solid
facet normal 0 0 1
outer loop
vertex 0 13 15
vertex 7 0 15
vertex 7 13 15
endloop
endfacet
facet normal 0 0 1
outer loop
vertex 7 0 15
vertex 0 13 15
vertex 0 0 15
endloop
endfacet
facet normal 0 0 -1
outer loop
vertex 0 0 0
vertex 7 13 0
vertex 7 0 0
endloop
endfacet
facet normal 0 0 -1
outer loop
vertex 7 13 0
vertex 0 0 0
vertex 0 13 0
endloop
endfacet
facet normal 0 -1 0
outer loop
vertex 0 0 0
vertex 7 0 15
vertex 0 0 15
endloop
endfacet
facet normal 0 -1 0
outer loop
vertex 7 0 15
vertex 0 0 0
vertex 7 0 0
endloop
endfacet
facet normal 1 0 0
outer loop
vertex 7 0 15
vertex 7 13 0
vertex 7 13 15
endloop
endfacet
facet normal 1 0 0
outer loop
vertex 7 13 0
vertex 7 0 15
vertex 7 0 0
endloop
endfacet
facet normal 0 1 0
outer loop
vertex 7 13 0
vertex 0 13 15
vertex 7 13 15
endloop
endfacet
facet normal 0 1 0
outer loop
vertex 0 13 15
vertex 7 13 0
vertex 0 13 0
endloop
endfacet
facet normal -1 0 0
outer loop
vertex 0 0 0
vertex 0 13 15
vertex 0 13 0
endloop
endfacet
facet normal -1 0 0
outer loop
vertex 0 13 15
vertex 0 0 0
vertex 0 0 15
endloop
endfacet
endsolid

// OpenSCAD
// Generated by SolidPython 1.0.1 on 2020-07-29 00:46:55


cube(size = [7, 13, 15]);
/***********************************************
*********      SolidPython code:      **********
************************************************
 
# import packages: SolidPython
from solid import *
from solid.utils import *
from itertools import chain, combinations, permutations


class Resize:

    def __init__(self, scad_file):
        self.scad_file = scad_file
        #self.scad_file = import_scad(scad_file)
        # cone/cylinder param:
        self.r1 = 0
        self.r2 = 0
        self.h = 0
        # rectangular prism param:
        self.w = 0
        self.l = 0
        # ellipse param:
        self.r = 0

    # import OpenScad code (file name corresponds to shape)


    # classify shape + parameters
    def assign(self, param1, param2, param3):
        if self.scad_file == 'cone.scad':
            self.r1 = param1
            self.r2 = param2
            self.h = param3
        elif self.scad_file == 'cylinder.scad':
            self.r1 = param1
            self.r2 = param2
            self.h = param3
        elif self.scad_file == 'rectangularPrism.scad':
            self.h = param1
            self.l = param2
            self.w = param3
        else:
            self.r = param1
            self.h = param2

    # resize parameters
    def iterate(self):
        x = range(3, 20, 2)
        i = 1
        if self.scad_file == 'cone.scad':
            tempList = list(permutations(x, 2))
            for temp in tempList:
                param1 = temp[0]
                param2 = temp[1]
                filepath = 'produced_scad_files/' + 'cone' + str(param1) + '_' + str(param2) + '_' + '.scad'
                scad_render_to_file(cylinder(h=param1, r1=param2, r2=0), filepath)

        elif self.scad_file == 'cylinder.scad':
            tempList = list(permutations(x, 3))
            for temp in tempList:
                param1 = temp[0]
                param2 = temp[1]
                filepath = 'produced_scad_files/' + 'cylinder' + str(param1) + '_' + str(param2) + '_' + '.scad'
                scad_render_to_file(cylinder(h=param1, r1=param2, r2=param2), filepath)

        elif self.scad_file == 'rectangularPrism.scad':
            tempList = list(permutations(x, 3))
            for temp in tempList:
                param1 = temp[0]
                param2 = temp[1]
                param3 = temp[2]
                filepath = 'produced_scad_files/' + 'rectangularPrism' + str(param1) + '_' + str(param2) + '_' + str(
                    param3) + '.scad'
                scad_render_to_file(cube(size=(param1, param2, param3)), filepath)

        elif self.scad_file == 'ellipse.scad':
            tempList = list(permutations(x, 4))
            for temp in tempList:
                param1 = temp[0]
                param2 = temp[1]
                param3 = temp[2]
                param4 = temp[3]
                filepath = 'produced_scad_files/' + 'ellipse' + str(param1) + '_' + str(param2) + '_' + str(param3) + '_' + str(param4) + '.scad'
                scad_render_to_file(scale([param1, param2, param3])(sphere(r=param4)), filepath)

    def render_to_scadfile(self):
        scad_render_to_file(scad, 'example.scad') 
 
************************************************/
